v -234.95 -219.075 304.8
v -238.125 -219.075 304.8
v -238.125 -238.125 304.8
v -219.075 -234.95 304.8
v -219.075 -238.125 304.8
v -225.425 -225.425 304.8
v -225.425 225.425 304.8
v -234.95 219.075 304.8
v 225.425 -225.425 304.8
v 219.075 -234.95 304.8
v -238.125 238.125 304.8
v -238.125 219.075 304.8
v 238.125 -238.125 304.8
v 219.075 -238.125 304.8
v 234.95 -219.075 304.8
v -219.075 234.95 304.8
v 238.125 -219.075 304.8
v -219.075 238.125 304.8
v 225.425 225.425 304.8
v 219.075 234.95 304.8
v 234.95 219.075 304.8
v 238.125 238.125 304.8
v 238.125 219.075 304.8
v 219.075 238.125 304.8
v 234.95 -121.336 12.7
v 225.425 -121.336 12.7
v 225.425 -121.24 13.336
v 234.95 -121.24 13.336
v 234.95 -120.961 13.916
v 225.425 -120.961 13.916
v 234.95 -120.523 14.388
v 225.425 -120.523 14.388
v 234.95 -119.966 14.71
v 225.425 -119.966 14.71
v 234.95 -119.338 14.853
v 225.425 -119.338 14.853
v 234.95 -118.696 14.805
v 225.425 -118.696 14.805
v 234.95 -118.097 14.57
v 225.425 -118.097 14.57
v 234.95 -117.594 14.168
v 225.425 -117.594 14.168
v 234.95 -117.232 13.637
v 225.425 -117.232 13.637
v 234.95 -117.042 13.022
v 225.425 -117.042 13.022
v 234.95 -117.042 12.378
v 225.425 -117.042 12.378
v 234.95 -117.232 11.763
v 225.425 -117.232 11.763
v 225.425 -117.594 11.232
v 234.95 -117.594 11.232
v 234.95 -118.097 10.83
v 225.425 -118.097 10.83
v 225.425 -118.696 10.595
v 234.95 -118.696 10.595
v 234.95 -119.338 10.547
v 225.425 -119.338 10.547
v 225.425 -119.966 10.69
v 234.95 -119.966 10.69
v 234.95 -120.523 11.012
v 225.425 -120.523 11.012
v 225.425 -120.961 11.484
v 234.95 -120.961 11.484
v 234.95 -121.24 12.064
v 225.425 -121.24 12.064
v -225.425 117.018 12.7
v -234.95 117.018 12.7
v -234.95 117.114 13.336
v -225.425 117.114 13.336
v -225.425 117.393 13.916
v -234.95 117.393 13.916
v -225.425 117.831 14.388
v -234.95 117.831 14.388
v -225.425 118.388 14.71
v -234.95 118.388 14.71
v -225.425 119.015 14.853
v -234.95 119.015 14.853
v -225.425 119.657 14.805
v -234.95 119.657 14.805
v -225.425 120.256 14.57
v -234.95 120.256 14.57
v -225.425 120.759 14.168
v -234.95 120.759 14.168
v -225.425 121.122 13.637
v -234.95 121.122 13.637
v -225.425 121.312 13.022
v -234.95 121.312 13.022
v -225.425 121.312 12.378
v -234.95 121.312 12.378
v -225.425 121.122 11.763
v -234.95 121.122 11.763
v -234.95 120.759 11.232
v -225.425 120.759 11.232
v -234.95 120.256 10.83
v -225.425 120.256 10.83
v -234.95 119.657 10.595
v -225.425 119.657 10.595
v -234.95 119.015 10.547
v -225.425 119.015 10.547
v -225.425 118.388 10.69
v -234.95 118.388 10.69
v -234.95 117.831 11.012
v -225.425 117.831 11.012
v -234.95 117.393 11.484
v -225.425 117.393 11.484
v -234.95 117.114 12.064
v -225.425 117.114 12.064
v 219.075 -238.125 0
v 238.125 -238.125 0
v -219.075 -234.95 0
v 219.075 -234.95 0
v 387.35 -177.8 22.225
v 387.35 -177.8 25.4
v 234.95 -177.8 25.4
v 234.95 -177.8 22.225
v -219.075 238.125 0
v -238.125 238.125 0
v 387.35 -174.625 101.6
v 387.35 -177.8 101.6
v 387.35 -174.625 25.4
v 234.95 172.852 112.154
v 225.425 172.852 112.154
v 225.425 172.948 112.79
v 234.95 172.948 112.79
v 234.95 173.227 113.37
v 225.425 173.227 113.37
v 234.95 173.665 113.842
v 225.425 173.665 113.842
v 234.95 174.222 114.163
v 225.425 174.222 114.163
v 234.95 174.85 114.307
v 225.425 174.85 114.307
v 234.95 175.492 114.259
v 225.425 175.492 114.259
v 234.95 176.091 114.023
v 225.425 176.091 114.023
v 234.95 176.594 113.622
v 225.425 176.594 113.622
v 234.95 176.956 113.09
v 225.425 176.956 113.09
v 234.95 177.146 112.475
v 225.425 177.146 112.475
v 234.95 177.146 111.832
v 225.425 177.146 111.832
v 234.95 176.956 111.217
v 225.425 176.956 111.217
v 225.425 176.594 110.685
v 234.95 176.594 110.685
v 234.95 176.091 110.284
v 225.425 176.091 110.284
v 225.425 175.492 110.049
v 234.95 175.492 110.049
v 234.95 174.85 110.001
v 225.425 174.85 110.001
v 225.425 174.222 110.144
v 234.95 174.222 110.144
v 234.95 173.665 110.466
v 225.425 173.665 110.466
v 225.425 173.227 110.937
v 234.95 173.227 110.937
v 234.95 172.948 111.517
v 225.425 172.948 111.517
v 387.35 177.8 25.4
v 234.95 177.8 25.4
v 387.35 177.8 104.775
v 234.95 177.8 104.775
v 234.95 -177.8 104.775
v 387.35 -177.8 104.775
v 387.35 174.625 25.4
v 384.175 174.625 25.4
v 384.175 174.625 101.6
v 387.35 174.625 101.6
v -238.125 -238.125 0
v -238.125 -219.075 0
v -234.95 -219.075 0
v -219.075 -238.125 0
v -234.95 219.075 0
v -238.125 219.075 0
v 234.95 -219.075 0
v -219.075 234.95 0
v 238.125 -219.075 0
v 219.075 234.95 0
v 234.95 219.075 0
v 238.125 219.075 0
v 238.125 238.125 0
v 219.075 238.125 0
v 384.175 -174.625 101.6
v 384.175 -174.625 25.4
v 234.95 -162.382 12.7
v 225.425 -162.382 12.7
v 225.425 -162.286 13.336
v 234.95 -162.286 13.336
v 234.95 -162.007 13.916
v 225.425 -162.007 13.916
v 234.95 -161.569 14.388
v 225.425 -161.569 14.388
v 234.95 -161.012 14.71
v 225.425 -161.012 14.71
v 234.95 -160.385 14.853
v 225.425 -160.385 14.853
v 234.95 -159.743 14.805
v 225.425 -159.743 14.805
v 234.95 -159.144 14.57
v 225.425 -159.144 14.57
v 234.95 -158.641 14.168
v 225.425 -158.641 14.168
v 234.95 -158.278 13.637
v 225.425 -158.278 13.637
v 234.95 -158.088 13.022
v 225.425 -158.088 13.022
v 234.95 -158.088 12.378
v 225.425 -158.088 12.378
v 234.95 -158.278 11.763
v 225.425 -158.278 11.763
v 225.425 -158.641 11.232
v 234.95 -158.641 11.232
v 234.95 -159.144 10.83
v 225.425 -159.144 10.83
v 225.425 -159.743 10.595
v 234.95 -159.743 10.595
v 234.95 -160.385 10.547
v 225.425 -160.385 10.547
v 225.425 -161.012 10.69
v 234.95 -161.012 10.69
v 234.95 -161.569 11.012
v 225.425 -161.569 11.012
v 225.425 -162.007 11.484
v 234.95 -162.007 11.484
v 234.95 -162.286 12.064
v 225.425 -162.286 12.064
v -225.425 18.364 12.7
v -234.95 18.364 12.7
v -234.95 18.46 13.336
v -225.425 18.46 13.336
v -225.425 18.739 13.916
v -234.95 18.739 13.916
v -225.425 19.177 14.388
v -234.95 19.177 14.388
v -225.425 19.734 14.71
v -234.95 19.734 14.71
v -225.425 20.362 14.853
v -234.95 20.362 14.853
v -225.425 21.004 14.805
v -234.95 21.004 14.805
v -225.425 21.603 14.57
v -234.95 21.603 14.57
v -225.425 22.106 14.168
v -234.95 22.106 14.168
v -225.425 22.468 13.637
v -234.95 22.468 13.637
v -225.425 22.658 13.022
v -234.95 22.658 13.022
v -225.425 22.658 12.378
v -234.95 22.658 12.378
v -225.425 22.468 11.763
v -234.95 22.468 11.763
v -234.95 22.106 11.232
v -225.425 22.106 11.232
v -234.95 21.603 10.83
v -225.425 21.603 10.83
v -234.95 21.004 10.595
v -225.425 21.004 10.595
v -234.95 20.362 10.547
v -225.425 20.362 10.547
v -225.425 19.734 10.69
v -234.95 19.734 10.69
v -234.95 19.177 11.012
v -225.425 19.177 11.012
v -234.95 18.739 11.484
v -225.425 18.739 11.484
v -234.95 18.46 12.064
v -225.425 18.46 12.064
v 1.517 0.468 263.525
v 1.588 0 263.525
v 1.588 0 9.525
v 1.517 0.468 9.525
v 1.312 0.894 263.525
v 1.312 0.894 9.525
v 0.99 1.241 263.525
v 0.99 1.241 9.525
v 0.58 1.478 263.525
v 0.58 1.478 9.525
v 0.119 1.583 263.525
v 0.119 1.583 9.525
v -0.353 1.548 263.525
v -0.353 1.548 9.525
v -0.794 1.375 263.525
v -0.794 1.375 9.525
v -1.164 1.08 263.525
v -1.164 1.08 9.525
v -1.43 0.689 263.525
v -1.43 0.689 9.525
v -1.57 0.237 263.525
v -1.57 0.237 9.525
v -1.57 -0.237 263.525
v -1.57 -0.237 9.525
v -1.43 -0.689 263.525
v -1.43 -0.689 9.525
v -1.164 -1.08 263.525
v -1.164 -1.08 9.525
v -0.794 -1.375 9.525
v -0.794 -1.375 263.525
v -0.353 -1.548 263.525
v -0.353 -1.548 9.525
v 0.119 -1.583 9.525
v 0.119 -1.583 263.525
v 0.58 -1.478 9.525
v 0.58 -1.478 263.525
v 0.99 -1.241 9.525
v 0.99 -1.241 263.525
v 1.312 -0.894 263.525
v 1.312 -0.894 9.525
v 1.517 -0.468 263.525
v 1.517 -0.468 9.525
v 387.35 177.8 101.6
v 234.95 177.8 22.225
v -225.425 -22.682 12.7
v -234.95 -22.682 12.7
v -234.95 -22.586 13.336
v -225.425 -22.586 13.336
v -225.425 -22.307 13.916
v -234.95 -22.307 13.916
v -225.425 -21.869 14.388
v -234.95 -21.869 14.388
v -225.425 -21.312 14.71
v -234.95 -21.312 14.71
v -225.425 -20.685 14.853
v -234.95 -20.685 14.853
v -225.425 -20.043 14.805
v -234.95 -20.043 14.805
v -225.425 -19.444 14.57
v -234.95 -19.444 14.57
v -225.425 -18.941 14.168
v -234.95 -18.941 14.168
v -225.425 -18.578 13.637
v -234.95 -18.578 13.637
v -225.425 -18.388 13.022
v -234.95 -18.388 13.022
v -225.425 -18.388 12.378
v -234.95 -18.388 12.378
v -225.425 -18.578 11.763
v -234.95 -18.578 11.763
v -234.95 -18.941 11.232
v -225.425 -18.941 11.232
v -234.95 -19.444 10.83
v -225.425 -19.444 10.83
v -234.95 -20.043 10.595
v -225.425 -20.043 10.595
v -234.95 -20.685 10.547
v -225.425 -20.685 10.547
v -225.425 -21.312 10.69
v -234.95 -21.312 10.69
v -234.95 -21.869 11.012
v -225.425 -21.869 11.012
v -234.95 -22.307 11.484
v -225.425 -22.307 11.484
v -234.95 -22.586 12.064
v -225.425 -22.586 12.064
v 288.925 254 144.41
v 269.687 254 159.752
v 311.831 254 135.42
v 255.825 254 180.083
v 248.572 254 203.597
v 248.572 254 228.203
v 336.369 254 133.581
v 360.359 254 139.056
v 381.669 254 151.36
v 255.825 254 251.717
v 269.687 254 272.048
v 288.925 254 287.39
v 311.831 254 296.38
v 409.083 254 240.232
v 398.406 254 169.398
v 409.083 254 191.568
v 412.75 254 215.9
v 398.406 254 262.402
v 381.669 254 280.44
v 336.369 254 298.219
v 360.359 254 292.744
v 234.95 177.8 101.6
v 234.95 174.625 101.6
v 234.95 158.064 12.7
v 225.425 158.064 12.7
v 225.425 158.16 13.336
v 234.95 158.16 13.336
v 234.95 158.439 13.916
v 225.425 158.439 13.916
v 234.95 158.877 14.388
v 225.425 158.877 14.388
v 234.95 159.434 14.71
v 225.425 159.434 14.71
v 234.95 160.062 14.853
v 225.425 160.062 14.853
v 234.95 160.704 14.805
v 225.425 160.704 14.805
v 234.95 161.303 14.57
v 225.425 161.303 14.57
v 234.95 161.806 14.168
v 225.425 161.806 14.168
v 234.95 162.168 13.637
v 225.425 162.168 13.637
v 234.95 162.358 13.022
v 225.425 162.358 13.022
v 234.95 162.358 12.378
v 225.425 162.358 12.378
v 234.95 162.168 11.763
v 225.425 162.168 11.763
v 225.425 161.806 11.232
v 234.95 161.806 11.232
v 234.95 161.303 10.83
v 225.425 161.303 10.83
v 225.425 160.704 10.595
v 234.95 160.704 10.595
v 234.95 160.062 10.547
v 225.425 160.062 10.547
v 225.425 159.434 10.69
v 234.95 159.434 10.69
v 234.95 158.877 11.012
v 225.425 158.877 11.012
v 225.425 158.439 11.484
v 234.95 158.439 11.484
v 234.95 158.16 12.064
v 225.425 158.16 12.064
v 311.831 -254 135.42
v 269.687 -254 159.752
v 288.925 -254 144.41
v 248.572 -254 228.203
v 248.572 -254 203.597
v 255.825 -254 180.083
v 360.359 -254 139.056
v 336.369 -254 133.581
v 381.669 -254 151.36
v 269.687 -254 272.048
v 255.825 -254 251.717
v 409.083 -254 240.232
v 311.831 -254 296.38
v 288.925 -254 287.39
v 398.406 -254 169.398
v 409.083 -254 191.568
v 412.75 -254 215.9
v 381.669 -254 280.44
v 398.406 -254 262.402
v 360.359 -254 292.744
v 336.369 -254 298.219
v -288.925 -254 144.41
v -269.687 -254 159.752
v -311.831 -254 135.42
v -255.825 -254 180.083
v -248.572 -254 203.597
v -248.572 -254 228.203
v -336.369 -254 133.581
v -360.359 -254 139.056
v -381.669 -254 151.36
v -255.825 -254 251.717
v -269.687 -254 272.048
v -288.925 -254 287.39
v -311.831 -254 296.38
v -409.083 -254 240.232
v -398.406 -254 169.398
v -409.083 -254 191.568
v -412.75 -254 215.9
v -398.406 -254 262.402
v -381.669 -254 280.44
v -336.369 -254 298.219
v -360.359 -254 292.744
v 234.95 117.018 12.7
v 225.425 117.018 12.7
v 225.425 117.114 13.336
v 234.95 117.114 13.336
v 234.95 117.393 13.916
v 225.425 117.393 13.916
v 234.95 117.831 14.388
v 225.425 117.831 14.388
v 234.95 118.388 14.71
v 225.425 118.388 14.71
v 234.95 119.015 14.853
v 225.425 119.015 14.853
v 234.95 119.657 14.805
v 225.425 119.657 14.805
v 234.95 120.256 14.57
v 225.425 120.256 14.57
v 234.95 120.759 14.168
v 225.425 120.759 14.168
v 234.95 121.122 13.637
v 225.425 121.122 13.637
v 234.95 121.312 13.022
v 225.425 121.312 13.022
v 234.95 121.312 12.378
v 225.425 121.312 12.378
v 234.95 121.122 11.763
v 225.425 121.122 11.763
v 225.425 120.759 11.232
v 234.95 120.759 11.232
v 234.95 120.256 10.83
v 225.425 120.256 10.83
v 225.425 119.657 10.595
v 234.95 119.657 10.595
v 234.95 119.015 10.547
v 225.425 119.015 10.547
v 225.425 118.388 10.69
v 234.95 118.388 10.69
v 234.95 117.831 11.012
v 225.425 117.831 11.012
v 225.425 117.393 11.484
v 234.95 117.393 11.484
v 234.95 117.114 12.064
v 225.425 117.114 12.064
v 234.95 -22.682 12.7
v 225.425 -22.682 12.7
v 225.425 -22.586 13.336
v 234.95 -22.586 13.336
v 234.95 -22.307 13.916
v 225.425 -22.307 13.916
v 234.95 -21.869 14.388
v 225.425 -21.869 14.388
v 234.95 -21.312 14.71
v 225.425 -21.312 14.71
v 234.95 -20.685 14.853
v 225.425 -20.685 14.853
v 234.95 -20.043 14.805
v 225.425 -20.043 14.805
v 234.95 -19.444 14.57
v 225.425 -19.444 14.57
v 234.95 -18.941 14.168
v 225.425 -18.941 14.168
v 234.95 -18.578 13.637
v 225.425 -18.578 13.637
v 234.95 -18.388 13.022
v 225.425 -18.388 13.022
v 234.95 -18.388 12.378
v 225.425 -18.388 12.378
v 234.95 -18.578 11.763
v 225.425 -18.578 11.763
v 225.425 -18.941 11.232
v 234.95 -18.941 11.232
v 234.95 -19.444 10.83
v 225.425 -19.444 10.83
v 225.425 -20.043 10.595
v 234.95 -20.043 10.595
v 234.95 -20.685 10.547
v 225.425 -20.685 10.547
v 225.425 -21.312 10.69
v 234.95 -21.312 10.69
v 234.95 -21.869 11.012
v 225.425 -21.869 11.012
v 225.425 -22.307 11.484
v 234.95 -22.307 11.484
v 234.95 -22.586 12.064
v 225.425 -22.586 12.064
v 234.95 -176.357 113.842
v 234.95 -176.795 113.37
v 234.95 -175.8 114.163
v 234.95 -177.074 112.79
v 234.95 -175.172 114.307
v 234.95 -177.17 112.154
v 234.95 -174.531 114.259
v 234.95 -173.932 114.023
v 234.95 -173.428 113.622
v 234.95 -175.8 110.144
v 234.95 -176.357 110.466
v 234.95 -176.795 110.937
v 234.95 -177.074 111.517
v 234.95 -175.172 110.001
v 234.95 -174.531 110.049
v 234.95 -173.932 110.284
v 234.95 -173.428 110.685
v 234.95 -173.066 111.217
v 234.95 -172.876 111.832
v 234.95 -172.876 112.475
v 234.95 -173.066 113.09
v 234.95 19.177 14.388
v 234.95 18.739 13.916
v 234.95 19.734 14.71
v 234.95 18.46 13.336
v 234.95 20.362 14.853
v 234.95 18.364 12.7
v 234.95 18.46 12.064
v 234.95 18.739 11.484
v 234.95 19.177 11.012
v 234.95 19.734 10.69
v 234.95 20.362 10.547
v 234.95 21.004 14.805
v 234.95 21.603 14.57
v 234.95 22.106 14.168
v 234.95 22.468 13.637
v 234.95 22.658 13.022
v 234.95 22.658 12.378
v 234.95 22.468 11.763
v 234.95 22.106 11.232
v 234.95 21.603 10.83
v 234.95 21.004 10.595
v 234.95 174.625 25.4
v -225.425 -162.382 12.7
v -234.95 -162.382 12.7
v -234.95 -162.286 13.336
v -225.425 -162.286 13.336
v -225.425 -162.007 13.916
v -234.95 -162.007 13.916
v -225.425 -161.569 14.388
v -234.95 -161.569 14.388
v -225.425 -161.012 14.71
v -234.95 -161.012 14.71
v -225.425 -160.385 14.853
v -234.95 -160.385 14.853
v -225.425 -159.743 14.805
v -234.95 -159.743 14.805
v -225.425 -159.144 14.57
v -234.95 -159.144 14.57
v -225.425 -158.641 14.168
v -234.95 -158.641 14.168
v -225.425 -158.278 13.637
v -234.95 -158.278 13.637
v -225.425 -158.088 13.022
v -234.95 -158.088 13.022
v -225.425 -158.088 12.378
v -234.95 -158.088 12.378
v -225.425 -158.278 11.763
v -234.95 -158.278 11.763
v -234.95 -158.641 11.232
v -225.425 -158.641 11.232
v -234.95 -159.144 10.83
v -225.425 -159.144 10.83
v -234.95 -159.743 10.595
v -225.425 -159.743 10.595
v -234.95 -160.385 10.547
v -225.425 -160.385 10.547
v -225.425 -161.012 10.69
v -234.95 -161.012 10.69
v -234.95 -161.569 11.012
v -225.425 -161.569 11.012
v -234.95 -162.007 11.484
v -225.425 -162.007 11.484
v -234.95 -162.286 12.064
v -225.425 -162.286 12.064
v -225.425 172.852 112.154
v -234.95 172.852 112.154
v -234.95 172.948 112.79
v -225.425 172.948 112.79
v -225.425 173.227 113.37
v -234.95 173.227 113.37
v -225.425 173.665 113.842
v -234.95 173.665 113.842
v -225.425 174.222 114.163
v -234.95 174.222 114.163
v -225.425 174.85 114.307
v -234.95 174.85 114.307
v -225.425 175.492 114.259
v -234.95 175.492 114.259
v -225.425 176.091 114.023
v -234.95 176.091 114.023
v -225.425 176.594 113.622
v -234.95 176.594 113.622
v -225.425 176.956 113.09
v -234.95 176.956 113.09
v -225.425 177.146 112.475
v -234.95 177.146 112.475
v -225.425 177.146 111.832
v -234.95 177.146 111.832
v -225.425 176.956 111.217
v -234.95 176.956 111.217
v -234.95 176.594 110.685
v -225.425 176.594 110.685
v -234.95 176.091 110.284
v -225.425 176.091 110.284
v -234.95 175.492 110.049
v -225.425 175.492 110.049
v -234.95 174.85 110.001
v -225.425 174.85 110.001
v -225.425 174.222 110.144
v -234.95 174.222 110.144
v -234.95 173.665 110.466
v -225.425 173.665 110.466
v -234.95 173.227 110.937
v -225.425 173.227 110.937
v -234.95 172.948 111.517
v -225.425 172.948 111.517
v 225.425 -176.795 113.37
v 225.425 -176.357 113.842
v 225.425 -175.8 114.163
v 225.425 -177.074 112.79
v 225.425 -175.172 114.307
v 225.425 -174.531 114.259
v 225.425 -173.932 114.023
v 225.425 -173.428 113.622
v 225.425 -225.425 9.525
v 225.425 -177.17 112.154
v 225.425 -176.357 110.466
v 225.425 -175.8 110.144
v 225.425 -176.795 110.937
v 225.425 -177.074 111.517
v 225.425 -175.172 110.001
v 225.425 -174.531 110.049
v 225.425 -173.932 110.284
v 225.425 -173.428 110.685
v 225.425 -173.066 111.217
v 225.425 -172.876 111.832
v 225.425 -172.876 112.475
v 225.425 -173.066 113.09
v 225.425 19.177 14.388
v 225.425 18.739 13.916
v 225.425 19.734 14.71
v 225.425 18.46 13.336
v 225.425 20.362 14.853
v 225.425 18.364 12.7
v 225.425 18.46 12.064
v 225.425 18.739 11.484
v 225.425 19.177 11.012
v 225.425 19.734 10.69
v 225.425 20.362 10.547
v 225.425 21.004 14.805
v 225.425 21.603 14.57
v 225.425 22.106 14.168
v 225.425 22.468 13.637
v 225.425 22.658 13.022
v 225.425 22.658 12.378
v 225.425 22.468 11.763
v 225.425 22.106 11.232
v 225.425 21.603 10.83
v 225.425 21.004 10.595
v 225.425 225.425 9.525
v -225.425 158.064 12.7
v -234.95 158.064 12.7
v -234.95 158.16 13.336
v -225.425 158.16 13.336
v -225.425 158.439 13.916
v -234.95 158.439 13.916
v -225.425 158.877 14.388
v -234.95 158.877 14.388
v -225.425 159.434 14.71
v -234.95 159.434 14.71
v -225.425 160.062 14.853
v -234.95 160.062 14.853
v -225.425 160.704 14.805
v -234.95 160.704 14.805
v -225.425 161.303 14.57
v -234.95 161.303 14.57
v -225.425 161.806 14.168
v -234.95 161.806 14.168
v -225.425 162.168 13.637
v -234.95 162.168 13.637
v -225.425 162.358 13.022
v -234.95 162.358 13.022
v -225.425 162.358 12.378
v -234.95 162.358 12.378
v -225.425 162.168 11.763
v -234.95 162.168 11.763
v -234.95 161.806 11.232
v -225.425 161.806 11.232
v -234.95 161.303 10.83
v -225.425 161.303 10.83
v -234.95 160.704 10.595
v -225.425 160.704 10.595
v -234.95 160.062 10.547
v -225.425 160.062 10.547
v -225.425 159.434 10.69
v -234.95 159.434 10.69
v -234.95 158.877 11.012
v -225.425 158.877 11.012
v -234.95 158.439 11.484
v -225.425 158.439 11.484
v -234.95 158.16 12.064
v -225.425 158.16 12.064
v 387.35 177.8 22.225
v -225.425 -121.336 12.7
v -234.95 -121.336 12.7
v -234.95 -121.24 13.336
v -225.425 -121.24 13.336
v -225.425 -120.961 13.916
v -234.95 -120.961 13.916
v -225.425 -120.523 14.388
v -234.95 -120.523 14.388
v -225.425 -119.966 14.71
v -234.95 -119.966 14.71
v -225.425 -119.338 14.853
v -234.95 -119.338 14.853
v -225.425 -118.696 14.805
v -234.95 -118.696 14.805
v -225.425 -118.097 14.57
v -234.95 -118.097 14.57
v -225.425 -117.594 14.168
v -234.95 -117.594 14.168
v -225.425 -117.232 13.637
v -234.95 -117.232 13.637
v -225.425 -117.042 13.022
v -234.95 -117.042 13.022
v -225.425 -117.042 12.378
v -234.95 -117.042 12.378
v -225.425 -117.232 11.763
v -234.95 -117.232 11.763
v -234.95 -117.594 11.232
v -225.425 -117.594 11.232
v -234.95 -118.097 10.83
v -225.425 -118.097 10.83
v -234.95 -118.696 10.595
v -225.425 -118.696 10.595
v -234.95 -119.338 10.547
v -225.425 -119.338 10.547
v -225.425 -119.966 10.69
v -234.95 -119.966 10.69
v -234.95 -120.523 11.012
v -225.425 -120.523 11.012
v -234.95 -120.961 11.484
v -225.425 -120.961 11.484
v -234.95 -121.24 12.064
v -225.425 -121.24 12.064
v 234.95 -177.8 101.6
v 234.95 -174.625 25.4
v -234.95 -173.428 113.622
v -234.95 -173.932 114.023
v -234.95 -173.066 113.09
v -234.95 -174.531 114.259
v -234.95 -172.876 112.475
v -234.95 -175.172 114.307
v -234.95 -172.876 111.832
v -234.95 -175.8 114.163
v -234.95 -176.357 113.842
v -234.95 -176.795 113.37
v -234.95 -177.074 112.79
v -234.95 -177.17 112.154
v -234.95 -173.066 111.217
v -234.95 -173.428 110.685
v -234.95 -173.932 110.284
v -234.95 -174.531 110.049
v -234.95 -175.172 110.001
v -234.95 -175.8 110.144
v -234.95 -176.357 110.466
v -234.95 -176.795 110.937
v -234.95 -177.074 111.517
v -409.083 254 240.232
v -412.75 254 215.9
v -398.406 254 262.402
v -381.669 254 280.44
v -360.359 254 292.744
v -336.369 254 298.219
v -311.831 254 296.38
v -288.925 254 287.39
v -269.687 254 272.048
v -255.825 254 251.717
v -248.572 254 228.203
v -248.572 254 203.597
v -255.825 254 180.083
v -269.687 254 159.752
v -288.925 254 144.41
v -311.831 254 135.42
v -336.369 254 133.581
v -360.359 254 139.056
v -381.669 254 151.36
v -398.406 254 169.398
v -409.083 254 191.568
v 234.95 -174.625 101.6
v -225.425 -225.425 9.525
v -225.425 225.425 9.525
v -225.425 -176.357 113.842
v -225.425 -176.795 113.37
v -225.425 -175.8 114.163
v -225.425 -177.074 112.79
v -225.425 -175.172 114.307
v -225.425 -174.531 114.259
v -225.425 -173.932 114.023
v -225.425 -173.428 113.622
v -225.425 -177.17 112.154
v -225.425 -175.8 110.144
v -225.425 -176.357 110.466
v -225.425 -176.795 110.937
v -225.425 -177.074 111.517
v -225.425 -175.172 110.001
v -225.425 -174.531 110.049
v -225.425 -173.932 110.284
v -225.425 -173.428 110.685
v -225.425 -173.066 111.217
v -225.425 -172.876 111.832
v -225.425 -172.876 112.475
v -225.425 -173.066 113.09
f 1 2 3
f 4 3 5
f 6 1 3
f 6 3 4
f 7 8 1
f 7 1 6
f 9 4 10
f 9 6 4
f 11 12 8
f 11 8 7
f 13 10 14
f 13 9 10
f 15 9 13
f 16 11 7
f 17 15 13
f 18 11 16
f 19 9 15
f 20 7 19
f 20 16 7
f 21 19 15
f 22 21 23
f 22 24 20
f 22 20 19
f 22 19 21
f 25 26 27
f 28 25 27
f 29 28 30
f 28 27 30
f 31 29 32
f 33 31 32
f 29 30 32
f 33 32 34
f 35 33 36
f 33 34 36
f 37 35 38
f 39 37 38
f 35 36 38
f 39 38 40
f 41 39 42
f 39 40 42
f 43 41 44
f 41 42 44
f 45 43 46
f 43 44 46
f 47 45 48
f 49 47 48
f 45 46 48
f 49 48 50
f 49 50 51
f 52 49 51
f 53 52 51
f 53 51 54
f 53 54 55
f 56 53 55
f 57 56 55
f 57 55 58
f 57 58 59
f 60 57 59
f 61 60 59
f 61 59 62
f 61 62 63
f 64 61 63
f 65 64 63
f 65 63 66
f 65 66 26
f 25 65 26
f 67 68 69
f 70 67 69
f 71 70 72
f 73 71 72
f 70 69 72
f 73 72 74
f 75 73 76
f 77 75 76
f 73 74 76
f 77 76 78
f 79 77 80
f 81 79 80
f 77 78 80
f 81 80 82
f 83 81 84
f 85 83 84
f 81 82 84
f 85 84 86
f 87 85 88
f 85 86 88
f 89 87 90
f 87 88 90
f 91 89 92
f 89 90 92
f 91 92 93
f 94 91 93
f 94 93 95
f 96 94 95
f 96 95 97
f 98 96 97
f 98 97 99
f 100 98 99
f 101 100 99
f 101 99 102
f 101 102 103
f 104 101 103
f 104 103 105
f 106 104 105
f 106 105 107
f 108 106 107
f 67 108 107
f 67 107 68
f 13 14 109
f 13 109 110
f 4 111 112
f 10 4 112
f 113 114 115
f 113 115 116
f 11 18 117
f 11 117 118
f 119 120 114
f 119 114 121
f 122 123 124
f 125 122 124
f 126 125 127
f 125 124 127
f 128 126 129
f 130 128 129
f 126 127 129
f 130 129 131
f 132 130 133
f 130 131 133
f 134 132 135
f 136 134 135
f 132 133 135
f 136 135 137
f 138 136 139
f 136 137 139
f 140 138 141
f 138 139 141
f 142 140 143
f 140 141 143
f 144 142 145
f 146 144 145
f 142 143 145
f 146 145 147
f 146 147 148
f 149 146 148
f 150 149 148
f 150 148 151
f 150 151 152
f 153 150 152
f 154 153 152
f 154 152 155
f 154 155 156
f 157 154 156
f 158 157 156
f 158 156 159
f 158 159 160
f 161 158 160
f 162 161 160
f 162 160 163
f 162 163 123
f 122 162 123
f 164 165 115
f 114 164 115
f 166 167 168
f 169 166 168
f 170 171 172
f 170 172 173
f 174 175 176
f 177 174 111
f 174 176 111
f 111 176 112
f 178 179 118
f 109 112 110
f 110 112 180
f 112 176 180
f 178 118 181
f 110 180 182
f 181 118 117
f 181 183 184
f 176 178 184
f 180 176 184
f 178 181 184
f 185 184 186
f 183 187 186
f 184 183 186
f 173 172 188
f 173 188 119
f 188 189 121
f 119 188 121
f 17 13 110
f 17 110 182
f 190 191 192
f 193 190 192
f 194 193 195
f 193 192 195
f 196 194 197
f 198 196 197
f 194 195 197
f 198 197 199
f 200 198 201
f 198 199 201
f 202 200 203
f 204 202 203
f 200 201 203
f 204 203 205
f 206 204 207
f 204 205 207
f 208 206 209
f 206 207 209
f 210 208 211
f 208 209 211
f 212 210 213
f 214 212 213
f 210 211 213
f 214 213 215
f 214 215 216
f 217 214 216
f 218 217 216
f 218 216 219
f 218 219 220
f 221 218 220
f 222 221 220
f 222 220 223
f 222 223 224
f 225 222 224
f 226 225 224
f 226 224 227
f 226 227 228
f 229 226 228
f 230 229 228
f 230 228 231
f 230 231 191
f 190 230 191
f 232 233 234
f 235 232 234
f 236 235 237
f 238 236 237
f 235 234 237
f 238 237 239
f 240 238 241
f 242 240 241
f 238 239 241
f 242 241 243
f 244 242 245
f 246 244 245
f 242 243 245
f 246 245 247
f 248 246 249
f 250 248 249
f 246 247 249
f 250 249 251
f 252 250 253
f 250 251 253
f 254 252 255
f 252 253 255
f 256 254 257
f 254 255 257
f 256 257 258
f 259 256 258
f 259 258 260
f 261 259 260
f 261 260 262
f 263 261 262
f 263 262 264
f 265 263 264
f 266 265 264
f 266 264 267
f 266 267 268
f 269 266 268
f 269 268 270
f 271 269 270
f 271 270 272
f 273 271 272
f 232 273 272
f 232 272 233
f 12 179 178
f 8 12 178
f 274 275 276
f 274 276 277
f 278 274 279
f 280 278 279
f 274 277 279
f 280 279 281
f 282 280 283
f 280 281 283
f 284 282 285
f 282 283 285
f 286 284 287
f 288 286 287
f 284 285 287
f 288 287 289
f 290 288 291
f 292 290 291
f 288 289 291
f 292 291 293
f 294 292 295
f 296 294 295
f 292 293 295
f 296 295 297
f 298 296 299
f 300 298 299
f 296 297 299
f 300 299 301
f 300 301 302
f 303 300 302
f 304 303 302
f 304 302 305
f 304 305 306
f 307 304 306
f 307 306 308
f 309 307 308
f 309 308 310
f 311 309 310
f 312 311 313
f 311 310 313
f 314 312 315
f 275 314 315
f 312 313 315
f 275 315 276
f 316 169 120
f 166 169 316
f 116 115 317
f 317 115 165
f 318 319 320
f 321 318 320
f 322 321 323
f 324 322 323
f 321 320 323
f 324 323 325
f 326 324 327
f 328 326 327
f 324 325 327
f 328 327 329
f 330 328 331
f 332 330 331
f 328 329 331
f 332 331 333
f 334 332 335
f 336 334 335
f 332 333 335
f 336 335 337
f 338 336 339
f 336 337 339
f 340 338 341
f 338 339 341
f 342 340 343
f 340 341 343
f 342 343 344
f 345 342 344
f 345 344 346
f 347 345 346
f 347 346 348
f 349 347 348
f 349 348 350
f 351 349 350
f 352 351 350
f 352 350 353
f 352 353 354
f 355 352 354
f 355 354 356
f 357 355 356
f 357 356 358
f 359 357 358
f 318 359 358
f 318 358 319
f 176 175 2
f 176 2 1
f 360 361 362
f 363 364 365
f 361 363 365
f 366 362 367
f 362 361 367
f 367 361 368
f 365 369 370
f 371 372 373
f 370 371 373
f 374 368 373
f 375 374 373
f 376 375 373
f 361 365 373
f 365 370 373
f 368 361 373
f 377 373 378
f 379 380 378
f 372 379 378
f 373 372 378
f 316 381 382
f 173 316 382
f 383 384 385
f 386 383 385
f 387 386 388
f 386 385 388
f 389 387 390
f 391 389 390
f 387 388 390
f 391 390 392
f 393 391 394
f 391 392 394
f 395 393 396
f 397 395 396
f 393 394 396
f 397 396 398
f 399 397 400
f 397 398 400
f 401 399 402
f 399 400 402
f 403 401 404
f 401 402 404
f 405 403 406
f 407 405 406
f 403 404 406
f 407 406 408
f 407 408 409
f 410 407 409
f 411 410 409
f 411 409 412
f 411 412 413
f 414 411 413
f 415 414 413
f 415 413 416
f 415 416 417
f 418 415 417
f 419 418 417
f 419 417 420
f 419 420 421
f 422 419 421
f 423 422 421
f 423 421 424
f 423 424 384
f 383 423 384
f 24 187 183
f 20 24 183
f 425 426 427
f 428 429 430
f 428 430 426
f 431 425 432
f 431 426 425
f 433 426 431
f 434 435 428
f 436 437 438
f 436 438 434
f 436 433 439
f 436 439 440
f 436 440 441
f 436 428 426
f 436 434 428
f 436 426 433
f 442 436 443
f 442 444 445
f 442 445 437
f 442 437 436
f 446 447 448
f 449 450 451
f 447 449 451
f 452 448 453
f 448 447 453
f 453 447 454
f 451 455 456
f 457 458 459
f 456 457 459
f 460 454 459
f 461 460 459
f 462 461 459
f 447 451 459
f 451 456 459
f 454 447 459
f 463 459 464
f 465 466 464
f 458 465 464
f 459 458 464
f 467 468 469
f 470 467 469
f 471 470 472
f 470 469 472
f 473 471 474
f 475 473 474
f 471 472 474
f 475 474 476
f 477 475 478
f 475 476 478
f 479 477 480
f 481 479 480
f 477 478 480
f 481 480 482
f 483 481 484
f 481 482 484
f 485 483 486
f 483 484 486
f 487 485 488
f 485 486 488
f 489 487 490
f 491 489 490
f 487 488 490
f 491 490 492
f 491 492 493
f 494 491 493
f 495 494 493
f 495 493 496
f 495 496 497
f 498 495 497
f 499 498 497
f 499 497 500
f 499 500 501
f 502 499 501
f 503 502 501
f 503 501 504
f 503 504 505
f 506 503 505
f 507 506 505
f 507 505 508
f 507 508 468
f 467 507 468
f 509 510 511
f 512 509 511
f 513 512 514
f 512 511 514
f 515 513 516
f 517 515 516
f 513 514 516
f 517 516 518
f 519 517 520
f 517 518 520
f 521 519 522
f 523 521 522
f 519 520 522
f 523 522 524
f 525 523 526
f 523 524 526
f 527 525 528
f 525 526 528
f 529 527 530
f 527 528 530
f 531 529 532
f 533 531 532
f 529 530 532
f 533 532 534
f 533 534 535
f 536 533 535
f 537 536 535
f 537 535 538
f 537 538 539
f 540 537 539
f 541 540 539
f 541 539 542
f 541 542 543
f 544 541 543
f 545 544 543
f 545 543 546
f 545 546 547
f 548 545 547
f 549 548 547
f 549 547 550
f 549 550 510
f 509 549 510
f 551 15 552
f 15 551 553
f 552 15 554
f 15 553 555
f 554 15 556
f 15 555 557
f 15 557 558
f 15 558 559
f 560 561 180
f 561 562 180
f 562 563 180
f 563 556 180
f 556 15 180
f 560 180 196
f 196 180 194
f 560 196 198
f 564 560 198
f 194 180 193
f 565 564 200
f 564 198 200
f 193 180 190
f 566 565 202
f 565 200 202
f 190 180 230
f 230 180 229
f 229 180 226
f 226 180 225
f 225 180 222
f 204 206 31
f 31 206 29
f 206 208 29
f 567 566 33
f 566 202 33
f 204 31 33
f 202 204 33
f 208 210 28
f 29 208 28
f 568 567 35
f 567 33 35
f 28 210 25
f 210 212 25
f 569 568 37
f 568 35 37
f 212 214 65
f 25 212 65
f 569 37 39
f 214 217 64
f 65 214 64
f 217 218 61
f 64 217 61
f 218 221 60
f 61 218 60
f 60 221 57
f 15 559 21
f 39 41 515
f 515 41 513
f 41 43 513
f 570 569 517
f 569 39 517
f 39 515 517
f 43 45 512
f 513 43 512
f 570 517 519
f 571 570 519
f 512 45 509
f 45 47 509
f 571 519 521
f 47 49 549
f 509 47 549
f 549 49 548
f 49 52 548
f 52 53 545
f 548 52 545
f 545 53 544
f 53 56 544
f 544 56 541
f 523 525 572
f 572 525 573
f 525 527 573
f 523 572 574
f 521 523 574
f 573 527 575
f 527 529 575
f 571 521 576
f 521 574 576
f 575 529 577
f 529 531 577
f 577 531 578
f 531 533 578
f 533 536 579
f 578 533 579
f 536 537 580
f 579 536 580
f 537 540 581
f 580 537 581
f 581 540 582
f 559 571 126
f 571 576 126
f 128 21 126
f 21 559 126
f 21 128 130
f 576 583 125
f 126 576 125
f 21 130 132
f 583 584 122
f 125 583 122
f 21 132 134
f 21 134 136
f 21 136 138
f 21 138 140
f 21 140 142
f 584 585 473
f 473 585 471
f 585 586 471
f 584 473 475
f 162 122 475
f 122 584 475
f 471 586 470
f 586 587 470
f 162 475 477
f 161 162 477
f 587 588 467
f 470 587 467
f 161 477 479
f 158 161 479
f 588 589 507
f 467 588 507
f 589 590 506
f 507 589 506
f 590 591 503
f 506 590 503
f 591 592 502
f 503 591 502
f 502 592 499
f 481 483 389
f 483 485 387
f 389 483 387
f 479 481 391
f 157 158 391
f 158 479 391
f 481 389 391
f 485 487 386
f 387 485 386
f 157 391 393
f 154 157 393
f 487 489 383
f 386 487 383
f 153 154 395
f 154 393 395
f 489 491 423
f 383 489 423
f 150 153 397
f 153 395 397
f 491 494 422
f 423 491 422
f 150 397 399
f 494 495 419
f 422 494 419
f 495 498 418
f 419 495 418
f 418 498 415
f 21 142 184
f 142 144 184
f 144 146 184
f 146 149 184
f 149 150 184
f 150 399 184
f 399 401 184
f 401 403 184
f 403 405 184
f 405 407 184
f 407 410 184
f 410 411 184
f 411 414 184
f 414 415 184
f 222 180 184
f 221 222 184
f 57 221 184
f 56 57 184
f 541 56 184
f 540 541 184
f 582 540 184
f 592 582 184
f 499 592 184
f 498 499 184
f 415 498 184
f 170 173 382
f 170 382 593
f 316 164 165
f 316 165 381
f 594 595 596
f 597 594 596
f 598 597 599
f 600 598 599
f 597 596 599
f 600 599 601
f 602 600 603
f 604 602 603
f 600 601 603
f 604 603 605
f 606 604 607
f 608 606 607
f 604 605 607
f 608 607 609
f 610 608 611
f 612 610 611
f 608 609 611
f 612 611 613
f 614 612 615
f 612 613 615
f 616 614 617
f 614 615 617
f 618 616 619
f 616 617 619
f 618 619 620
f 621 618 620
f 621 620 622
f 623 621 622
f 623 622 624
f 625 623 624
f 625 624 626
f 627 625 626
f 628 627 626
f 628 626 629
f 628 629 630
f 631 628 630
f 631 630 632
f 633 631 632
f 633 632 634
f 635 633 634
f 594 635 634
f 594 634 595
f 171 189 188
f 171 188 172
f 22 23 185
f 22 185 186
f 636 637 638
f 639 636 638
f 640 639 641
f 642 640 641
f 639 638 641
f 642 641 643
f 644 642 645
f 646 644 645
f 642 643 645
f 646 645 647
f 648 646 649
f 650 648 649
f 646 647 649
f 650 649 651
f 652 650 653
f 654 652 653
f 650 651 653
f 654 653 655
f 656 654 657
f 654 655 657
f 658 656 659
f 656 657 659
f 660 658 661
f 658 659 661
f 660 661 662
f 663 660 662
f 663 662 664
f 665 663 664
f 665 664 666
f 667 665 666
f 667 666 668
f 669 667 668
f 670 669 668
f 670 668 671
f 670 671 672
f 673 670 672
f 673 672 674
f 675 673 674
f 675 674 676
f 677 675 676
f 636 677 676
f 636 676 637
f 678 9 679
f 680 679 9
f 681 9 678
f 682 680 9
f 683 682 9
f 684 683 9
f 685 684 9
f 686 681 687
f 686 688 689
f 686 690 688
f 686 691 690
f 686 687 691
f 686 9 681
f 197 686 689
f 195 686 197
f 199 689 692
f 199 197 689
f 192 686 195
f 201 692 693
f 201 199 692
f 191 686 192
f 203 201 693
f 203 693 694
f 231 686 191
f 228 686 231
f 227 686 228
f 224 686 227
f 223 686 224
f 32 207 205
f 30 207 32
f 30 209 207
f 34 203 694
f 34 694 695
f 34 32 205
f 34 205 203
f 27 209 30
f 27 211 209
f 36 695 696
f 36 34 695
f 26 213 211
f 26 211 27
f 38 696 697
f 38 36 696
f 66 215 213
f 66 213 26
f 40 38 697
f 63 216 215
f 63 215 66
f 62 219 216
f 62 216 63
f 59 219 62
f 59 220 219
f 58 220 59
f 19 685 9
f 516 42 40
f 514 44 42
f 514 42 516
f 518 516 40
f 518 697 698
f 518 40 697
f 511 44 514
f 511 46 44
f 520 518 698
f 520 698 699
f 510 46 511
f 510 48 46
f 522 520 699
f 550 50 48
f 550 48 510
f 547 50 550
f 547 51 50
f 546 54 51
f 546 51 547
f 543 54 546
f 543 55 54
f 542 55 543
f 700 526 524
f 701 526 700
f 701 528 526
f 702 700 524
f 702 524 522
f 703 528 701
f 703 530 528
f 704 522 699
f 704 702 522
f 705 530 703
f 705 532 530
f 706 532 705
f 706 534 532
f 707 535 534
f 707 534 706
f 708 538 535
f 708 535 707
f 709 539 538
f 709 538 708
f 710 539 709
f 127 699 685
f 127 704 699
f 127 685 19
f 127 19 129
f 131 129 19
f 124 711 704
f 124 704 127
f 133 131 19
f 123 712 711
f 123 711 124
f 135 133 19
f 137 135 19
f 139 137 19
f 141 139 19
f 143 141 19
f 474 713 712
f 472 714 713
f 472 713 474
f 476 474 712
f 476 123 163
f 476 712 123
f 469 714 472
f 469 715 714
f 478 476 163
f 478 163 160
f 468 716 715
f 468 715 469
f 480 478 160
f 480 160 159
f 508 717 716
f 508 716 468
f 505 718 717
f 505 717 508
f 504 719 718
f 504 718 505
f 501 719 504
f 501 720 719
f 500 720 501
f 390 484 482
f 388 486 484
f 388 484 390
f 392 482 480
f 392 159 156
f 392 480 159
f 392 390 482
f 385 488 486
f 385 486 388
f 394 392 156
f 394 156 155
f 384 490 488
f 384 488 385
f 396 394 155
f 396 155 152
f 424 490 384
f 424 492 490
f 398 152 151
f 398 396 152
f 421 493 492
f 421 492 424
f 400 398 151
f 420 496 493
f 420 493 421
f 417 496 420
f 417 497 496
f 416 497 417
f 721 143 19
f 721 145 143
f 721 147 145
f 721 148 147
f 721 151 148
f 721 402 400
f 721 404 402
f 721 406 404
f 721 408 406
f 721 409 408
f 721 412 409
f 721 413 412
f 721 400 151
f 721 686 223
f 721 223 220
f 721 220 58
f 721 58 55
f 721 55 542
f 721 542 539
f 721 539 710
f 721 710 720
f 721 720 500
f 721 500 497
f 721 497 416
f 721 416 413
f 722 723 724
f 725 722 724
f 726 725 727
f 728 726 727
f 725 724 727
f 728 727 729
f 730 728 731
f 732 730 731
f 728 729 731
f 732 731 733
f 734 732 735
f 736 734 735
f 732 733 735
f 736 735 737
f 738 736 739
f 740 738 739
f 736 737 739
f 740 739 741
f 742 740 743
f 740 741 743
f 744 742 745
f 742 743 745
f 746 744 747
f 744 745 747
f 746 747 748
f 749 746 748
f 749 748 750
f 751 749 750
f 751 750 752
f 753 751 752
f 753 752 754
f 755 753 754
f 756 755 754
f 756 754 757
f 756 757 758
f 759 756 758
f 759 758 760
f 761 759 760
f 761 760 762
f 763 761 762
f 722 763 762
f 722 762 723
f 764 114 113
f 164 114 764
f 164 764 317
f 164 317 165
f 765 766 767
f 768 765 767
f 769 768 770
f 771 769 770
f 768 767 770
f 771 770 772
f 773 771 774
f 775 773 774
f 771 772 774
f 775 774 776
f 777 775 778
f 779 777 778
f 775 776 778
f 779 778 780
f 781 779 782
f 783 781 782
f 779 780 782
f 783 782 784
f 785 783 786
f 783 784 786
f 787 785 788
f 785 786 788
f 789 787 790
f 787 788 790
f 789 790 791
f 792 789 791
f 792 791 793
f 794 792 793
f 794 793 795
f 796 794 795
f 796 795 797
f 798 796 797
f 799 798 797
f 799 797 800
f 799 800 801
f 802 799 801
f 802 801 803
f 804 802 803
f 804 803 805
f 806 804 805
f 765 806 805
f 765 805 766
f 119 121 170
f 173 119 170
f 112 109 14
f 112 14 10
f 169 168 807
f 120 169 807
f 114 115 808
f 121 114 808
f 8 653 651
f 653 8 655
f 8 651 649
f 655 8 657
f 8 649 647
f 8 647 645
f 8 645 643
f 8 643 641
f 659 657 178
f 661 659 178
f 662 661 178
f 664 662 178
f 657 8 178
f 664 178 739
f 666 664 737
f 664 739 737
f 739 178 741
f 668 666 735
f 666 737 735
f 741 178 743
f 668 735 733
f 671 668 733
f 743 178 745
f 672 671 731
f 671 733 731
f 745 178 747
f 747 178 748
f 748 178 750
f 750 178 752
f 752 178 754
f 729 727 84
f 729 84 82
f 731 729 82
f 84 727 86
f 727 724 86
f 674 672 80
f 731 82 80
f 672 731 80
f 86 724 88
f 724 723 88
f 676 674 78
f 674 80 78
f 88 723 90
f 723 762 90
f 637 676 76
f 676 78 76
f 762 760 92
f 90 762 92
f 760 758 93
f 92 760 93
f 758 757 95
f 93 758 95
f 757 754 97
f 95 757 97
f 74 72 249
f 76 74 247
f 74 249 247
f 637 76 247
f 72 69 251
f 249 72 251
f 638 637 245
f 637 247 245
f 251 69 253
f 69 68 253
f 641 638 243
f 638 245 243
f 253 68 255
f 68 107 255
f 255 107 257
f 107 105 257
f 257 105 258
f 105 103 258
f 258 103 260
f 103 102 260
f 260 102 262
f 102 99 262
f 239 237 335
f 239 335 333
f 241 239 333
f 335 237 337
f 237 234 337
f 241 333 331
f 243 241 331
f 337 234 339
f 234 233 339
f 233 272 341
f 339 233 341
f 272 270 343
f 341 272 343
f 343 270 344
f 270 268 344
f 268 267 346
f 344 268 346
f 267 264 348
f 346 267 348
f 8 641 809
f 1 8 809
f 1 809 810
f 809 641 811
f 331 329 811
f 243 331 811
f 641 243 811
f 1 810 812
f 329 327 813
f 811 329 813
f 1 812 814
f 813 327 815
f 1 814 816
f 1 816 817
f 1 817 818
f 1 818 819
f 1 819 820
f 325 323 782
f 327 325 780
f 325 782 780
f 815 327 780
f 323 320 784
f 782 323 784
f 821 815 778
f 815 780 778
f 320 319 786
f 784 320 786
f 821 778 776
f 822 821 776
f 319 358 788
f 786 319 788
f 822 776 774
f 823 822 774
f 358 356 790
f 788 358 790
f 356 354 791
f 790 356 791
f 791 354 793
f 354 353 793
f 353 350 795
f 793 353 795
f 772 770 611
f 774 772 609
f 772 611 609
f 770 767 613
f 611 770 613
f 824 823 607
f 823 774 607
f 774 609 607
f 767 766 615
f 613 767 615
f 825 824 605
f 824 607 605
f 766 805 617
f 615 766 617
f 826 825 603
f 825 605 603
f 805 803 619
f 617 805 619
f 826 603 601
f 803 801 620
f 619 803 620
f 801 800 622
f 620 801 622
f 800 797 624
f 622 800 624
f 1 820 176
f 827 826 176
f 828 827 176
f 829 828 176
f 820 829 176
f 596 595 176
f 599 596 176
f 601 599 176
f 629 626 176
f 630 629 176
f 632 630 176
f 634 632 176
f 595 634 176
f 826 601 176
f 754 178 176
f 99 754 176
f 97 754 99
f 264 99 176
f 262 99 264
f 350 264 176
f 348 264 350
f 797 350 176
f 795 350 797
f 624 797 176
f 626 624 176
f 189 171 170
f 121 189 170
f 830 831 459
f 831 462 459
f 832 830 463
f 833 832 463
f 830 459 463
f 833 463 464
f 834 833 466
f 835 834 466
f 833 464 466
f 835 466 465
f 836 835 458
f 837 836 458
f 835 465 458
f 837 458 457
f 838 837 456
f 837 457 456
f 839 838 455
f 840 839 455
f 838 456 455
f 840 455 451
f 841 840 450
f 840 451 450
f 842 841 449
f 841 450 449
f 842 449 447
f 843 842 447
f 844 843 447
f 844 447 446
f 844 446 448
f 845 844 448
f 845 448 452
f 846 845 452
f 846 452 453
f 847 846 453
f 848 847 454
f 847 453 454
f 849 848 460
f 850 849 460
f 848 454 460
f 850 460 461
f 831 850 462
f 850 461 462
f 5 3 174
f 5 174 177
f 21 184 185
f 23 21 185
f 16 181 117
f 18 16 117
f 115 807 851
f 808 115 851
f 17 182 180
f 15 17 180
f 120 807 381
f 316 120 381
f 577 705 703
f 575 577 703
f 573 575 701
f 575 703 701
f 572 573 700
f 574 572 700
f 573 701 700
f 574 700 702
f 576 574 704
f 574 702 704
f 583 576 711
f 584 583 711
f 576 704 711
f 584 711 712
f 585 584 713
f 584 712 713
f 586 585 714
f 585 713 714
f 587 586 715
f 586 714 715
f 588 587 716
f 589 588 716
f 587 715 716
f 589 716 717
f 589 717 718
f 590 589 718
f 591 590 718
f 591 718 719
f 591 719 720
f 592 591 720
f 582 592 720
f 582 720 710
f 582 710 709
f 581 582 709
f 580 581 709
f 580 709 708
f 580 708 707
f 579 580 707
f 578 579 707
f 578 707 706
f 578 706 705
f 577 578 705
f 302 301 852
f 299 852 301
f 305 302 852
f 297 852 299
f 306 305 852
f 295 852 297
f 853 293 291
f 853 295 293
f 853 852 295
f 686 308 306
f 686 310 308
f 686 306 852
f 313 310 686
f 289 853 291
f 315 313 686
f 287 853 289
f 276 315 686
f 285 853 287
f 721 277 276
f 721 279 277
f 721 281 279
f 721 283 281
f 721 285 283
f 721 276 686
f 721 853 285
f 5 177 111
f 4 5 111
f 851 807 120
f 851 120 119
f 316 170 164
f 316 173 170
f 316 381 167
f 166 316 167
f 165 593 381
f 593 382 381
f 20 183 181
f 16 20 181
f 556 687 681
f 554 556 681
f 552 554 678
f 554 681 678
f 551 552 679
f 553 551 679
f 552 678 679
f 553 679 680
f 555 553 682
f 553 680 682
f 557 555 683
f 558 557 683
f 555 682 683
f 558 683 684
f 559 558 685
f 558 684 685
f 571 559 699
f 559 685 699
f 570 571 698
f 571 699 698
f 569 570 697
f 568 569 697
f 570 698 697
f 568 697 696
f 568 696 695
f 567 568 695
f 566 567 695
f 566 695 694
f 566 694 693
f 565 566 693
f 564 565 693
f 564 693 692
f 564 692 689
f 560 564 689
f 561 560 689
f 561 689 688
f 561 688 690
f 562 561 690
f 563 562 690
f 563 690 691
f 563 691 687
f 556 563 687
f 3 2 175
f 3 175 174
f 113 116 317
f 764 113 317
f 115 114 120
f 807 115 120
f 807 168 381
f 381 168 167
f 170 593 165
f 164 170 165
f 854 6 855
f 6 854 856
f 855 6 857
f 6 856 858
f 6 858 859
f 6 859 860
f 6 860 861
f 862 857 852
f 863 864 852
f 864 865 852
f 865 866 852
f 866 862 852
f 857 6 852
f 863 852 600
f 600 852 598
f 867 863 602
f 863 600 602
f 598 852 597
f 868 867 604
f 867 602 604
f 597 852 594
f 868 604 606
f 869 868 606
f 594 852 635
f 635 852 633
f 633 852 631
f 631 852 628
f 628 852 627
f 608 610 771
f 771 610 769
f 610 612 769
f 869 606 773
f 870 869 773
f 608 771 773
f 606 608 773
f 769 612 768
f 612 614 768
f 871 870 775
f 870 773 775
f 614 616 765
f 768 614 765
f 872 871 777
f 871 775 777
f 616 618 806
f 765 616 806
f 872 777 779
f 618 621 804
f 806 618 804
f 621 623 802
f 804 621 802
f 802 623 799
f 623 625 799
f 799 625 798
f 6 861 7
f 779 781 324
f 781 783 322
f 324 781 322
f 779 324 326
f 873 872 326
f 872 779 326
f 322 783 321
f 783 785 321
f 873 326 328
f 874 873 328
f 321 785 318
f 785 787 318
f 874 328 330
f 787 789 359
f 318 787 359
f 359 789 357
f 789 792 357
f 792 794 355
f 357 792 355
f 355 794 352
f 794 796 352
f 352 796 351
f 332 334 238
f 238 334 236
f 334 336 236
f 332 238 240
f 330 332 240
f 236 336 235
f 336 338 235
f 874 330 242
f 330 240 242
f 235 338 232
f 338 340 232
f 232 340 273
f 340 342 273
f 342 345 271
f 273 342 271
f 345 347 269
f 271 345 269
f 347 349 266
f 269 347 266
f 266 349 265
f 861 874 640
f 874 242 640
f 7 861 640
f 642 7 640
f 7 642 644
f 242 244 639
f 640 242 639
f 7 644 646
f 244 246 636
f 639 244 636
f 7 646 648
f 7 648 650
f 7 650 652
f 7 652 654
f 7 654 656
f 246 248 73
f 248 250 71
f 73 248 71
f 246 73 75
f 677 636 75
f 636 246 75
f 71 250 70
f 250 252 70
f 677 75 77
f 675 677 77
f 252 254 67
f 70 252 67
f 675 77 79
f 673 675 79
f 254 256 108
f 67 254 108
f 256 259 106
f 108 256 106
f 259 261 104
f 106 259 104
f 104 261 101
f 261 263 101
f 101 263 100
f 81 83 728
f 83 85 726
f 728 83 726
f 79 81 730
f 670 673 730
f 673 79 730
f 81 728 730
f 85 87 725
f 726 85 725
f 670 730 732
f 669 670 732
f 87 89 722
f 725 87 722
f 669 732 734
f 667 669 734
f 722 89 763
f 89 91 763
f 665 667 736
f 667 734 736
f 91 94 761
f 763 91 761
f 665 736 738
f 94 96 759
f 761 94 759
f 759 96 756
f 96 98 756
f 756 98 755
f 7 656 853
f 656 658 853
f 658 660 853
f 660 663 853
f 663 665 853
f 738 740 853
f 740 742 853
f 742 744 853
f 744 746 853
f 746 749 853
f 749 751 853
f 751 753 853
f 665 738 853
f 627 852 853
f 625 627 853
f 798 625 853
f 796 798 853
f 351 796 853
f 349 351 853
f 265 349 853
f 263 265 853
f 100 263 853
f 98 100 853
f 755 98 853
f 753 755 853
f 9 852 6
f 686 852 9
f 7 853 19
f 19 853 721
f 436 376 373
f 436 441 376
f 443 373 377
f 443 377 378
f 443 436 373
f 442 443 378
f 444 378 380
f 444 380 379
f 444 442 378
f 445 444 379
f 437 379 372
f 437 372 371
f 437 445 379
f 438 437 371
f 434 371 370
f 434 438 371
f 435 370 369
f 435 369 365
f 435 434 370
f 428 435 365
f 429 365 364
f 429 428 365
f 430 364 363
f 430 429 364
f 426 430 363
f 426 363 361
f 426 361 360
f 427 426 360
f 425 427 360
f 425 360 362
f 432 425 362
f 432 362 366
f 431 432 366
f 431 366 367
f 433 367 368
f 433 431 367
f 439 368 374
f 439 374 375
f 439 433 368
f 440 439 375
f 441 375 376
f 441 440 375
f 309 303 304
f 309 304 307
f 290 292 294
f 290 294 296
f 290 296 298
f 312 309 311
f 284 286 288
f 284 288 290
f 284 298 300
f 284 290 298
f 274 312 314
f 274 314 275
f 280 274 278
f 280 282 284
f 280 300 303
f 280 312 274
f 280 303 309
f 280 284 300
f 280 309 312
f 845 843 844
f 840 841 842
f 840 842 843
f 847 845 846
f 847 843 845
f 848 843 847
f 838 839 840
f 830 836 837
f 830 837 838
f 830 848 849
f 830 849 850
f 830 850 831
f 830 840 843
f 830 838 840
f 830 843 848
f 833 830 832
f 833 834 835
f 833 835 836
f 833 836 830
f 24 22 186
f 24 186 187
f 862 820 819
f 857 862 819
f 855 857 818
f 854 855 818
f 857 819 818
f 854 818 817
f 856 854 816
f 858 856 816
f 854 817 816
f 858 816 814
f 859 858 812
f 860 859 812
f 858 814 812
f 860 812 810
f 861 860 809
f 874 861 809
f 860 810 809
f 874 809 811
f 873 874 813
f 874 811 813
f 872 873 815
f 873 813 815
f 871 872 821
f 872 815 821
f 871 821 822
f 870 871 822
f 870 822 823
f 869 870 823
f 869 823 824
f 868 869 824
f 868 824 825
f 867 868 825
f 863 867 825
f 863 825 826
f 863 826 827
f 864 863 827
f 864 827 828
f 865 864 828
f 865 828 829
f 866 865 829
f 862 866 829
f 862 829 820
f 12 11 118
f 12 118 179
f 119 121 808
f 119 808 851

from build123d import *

# Parameters (mm, degrees)
F0_W      = 15.875
F0_H      = 3.175
F0_W_2    = 450.85
F0_H_2    = 450.85
F0_W_3    = 3.175
F0_H_3    = 15.875
F1_DEPTH  = 304.8
F2_DEPTH  = 9.525
F4_DEPTH  = 254
F7_D      = 4.318
F7_DEPTH  = 762
F7_TIP    = 1.2972580765
F9_DEPTH  = 152.4
F8_W      = 3.175
F8_H      = 76.2
F10_DEPTH = 152.4
F11_W     = 3.175
F11_H     = 349.25
F12_DEPTH = 76.2
F13_R     = 1.5875
F14_DEPTH = 254


with BuildPart() as f1:
    # F0 (on Top) → F1 (new body)
    with BuildSketch(Plane.XY):
        with Locations((227.0125, -236.5375)):
            Rectangle(F0_W, F0_H)
        Polygon((219.075, -234.95), (234.95, -234.95), (234.95, -219.075), (234.95, 219.075), (234.95, 234.95), (219.075, 234.95), (-219.075, 234.95), (-234.95, 234.95), (-234.95, 219.075), (-234.95, -219.075), (-234.95, -234.95), (-219.075, -234.95), align=None)
        Rectangle(F0_W_2, F0_H_2, mode=Mode.SUBTRACT)
        Polygon((234.95, -219.075), (234.95, -234.95), (234.95, -238.125), (238.125, -238.125), (238.125, -219.075), align=None)
        Polygon((-219.075, -238.125), (-219.075, -234.95), (-234.95, -234.95), (-238.125, -234.95), (-238.125, -238.125), align=None)
        with Locations((236.5375, 227.0125)):
            Rectangle(F0_W_3, F0_H_3)
        with Locations((-236.5375, -227.0125)):
            Rectangle(F0_W_3, F0_H_3)
        Polygon((219.075, 234.95), (234.95, 234.95), (238.125, 234.95), (238.125, 238.125), (219.075, 238.125), align=None)
        Polygon((-238.125, 219.075), (-234.95, 219.075), (-234.95, 234.95), (-234.95, 238.125), (-238.125, 238.125), align=None)
        with Locations((-227.0125, 236.5375)):
            Rectangle(F0_W, F0_H)
    extrude(amount=F1_DEPTH)

    # F0 (on Top) → F2 (join)
    with BuildSketch(Plane.XY):
        Rectangle(F0_W_2, F0_H_2)
    extrude(amount=F2_DEPTH)

    # F7
    with Locations(Plane.YZ.offset(234.95)):
        with Locations((-175.01108, 112.1537), (175.01108, 112.1537), (160.2232, 12.7), (119.1768, 12.7), (20.5232, 12.7), (-119.1768, 12.7), (-160.2232, 12.7), (-20.5232, 12.7)):
            Hole(F7_D / 2, depth=F7_DEPTH)
            with Locations((0, 0, -(F7_DEPTH + F7_TIP / 2))):  # 118° drill point
                Cone(0, F7_D / 2, F7_TIP, mode=Mode.SUBTRACT)

    # F13 (on face) → F14 (join)
    with BuildSketch(Plane.XY.offset(9.525)):
        Circle(F13_R)
    extrude(amount=F14_DEPTH)


with BuildPart() as f4:
    # F3 (on Front) → F4 (new body, symmetric)
    with BuildSketch(Plane.XZ):
        with BuildLine():
            ThreePointArc((247.65, 215.9), (330.2, 133.35), (412.75, 215.9))
            ThreePointArc((412.75, 215.9), (330.2, 298.45), (247.65, 215.9))
        make_face()
    extrude(amount=F4_DEPTH, both=True)


with BuildPart() as f5_1:
    # F5: instance of F4
    add(f4.part.mirror(Plane.YZ))


with BuildPart() as f9:
    # F8 (on face) → F9 (new body)
    with BuildSketch(Plane.YZ.offset(234.95)):
        Polygon((-177.8, 22.225), (0, 22.225), (177.8, 22.225), (177.8, 25.4), (174.625, 25.4), (-174.625, 25.4), (-177.8, 25.4), align=None)
    extrude(amount=F9_DEPTH)


with BuildPart() as f9b:
    # F8 (on face) → F9, piece 2 (new body)
    with BuildSketch(Plane.YZ.offset(234.95)):
        Polygon((-177.8, 104.775), (-177.8, 101.6), (-174.625, 101.6), (174.625, 101.6), (177.8, 101.6), (177.8, 104.775), (0, 104.775), align=None)
    extrude(amount=F9_DEPTH)


with BuildPart() as f10:
    # F8 (on face) → F10 (new body)
    with BuildSketch(Plane.YZ.offset(234.95)):
        with Locations((-176.2125, 63.5)):
            Rectangle(F8_W, F8_H)
    extrude(amount=F10_DEPTH)


with BuildPart() as f10b:
    # F8 (on face) → F10, piece 2 (new body)
    with BuildSketch(Plane.YZ.offset(234.95)):
        Polygon((174.625, 25.4), (177.8, 25.4), (177.8, 101.6), (174.625, 101.6), (174.625, 63.5), align=None)
    extrude(amount=F10_DEPTH)


with BuildPart() as f12:
    # F11 (on face) → F12 (new body, through all)
    with BuildSketch(Plane.XY.offset(25.4)):
        with Locations((385.7625, 0)):
            Rectangle(F11_W, F11_H)
    extrude(amount=F12_DEPTH)


solid = Compound([f1.part, f4.part, f5_1.part, f9.part, f9b.part, f10.part, f10b.part, f12.part])
